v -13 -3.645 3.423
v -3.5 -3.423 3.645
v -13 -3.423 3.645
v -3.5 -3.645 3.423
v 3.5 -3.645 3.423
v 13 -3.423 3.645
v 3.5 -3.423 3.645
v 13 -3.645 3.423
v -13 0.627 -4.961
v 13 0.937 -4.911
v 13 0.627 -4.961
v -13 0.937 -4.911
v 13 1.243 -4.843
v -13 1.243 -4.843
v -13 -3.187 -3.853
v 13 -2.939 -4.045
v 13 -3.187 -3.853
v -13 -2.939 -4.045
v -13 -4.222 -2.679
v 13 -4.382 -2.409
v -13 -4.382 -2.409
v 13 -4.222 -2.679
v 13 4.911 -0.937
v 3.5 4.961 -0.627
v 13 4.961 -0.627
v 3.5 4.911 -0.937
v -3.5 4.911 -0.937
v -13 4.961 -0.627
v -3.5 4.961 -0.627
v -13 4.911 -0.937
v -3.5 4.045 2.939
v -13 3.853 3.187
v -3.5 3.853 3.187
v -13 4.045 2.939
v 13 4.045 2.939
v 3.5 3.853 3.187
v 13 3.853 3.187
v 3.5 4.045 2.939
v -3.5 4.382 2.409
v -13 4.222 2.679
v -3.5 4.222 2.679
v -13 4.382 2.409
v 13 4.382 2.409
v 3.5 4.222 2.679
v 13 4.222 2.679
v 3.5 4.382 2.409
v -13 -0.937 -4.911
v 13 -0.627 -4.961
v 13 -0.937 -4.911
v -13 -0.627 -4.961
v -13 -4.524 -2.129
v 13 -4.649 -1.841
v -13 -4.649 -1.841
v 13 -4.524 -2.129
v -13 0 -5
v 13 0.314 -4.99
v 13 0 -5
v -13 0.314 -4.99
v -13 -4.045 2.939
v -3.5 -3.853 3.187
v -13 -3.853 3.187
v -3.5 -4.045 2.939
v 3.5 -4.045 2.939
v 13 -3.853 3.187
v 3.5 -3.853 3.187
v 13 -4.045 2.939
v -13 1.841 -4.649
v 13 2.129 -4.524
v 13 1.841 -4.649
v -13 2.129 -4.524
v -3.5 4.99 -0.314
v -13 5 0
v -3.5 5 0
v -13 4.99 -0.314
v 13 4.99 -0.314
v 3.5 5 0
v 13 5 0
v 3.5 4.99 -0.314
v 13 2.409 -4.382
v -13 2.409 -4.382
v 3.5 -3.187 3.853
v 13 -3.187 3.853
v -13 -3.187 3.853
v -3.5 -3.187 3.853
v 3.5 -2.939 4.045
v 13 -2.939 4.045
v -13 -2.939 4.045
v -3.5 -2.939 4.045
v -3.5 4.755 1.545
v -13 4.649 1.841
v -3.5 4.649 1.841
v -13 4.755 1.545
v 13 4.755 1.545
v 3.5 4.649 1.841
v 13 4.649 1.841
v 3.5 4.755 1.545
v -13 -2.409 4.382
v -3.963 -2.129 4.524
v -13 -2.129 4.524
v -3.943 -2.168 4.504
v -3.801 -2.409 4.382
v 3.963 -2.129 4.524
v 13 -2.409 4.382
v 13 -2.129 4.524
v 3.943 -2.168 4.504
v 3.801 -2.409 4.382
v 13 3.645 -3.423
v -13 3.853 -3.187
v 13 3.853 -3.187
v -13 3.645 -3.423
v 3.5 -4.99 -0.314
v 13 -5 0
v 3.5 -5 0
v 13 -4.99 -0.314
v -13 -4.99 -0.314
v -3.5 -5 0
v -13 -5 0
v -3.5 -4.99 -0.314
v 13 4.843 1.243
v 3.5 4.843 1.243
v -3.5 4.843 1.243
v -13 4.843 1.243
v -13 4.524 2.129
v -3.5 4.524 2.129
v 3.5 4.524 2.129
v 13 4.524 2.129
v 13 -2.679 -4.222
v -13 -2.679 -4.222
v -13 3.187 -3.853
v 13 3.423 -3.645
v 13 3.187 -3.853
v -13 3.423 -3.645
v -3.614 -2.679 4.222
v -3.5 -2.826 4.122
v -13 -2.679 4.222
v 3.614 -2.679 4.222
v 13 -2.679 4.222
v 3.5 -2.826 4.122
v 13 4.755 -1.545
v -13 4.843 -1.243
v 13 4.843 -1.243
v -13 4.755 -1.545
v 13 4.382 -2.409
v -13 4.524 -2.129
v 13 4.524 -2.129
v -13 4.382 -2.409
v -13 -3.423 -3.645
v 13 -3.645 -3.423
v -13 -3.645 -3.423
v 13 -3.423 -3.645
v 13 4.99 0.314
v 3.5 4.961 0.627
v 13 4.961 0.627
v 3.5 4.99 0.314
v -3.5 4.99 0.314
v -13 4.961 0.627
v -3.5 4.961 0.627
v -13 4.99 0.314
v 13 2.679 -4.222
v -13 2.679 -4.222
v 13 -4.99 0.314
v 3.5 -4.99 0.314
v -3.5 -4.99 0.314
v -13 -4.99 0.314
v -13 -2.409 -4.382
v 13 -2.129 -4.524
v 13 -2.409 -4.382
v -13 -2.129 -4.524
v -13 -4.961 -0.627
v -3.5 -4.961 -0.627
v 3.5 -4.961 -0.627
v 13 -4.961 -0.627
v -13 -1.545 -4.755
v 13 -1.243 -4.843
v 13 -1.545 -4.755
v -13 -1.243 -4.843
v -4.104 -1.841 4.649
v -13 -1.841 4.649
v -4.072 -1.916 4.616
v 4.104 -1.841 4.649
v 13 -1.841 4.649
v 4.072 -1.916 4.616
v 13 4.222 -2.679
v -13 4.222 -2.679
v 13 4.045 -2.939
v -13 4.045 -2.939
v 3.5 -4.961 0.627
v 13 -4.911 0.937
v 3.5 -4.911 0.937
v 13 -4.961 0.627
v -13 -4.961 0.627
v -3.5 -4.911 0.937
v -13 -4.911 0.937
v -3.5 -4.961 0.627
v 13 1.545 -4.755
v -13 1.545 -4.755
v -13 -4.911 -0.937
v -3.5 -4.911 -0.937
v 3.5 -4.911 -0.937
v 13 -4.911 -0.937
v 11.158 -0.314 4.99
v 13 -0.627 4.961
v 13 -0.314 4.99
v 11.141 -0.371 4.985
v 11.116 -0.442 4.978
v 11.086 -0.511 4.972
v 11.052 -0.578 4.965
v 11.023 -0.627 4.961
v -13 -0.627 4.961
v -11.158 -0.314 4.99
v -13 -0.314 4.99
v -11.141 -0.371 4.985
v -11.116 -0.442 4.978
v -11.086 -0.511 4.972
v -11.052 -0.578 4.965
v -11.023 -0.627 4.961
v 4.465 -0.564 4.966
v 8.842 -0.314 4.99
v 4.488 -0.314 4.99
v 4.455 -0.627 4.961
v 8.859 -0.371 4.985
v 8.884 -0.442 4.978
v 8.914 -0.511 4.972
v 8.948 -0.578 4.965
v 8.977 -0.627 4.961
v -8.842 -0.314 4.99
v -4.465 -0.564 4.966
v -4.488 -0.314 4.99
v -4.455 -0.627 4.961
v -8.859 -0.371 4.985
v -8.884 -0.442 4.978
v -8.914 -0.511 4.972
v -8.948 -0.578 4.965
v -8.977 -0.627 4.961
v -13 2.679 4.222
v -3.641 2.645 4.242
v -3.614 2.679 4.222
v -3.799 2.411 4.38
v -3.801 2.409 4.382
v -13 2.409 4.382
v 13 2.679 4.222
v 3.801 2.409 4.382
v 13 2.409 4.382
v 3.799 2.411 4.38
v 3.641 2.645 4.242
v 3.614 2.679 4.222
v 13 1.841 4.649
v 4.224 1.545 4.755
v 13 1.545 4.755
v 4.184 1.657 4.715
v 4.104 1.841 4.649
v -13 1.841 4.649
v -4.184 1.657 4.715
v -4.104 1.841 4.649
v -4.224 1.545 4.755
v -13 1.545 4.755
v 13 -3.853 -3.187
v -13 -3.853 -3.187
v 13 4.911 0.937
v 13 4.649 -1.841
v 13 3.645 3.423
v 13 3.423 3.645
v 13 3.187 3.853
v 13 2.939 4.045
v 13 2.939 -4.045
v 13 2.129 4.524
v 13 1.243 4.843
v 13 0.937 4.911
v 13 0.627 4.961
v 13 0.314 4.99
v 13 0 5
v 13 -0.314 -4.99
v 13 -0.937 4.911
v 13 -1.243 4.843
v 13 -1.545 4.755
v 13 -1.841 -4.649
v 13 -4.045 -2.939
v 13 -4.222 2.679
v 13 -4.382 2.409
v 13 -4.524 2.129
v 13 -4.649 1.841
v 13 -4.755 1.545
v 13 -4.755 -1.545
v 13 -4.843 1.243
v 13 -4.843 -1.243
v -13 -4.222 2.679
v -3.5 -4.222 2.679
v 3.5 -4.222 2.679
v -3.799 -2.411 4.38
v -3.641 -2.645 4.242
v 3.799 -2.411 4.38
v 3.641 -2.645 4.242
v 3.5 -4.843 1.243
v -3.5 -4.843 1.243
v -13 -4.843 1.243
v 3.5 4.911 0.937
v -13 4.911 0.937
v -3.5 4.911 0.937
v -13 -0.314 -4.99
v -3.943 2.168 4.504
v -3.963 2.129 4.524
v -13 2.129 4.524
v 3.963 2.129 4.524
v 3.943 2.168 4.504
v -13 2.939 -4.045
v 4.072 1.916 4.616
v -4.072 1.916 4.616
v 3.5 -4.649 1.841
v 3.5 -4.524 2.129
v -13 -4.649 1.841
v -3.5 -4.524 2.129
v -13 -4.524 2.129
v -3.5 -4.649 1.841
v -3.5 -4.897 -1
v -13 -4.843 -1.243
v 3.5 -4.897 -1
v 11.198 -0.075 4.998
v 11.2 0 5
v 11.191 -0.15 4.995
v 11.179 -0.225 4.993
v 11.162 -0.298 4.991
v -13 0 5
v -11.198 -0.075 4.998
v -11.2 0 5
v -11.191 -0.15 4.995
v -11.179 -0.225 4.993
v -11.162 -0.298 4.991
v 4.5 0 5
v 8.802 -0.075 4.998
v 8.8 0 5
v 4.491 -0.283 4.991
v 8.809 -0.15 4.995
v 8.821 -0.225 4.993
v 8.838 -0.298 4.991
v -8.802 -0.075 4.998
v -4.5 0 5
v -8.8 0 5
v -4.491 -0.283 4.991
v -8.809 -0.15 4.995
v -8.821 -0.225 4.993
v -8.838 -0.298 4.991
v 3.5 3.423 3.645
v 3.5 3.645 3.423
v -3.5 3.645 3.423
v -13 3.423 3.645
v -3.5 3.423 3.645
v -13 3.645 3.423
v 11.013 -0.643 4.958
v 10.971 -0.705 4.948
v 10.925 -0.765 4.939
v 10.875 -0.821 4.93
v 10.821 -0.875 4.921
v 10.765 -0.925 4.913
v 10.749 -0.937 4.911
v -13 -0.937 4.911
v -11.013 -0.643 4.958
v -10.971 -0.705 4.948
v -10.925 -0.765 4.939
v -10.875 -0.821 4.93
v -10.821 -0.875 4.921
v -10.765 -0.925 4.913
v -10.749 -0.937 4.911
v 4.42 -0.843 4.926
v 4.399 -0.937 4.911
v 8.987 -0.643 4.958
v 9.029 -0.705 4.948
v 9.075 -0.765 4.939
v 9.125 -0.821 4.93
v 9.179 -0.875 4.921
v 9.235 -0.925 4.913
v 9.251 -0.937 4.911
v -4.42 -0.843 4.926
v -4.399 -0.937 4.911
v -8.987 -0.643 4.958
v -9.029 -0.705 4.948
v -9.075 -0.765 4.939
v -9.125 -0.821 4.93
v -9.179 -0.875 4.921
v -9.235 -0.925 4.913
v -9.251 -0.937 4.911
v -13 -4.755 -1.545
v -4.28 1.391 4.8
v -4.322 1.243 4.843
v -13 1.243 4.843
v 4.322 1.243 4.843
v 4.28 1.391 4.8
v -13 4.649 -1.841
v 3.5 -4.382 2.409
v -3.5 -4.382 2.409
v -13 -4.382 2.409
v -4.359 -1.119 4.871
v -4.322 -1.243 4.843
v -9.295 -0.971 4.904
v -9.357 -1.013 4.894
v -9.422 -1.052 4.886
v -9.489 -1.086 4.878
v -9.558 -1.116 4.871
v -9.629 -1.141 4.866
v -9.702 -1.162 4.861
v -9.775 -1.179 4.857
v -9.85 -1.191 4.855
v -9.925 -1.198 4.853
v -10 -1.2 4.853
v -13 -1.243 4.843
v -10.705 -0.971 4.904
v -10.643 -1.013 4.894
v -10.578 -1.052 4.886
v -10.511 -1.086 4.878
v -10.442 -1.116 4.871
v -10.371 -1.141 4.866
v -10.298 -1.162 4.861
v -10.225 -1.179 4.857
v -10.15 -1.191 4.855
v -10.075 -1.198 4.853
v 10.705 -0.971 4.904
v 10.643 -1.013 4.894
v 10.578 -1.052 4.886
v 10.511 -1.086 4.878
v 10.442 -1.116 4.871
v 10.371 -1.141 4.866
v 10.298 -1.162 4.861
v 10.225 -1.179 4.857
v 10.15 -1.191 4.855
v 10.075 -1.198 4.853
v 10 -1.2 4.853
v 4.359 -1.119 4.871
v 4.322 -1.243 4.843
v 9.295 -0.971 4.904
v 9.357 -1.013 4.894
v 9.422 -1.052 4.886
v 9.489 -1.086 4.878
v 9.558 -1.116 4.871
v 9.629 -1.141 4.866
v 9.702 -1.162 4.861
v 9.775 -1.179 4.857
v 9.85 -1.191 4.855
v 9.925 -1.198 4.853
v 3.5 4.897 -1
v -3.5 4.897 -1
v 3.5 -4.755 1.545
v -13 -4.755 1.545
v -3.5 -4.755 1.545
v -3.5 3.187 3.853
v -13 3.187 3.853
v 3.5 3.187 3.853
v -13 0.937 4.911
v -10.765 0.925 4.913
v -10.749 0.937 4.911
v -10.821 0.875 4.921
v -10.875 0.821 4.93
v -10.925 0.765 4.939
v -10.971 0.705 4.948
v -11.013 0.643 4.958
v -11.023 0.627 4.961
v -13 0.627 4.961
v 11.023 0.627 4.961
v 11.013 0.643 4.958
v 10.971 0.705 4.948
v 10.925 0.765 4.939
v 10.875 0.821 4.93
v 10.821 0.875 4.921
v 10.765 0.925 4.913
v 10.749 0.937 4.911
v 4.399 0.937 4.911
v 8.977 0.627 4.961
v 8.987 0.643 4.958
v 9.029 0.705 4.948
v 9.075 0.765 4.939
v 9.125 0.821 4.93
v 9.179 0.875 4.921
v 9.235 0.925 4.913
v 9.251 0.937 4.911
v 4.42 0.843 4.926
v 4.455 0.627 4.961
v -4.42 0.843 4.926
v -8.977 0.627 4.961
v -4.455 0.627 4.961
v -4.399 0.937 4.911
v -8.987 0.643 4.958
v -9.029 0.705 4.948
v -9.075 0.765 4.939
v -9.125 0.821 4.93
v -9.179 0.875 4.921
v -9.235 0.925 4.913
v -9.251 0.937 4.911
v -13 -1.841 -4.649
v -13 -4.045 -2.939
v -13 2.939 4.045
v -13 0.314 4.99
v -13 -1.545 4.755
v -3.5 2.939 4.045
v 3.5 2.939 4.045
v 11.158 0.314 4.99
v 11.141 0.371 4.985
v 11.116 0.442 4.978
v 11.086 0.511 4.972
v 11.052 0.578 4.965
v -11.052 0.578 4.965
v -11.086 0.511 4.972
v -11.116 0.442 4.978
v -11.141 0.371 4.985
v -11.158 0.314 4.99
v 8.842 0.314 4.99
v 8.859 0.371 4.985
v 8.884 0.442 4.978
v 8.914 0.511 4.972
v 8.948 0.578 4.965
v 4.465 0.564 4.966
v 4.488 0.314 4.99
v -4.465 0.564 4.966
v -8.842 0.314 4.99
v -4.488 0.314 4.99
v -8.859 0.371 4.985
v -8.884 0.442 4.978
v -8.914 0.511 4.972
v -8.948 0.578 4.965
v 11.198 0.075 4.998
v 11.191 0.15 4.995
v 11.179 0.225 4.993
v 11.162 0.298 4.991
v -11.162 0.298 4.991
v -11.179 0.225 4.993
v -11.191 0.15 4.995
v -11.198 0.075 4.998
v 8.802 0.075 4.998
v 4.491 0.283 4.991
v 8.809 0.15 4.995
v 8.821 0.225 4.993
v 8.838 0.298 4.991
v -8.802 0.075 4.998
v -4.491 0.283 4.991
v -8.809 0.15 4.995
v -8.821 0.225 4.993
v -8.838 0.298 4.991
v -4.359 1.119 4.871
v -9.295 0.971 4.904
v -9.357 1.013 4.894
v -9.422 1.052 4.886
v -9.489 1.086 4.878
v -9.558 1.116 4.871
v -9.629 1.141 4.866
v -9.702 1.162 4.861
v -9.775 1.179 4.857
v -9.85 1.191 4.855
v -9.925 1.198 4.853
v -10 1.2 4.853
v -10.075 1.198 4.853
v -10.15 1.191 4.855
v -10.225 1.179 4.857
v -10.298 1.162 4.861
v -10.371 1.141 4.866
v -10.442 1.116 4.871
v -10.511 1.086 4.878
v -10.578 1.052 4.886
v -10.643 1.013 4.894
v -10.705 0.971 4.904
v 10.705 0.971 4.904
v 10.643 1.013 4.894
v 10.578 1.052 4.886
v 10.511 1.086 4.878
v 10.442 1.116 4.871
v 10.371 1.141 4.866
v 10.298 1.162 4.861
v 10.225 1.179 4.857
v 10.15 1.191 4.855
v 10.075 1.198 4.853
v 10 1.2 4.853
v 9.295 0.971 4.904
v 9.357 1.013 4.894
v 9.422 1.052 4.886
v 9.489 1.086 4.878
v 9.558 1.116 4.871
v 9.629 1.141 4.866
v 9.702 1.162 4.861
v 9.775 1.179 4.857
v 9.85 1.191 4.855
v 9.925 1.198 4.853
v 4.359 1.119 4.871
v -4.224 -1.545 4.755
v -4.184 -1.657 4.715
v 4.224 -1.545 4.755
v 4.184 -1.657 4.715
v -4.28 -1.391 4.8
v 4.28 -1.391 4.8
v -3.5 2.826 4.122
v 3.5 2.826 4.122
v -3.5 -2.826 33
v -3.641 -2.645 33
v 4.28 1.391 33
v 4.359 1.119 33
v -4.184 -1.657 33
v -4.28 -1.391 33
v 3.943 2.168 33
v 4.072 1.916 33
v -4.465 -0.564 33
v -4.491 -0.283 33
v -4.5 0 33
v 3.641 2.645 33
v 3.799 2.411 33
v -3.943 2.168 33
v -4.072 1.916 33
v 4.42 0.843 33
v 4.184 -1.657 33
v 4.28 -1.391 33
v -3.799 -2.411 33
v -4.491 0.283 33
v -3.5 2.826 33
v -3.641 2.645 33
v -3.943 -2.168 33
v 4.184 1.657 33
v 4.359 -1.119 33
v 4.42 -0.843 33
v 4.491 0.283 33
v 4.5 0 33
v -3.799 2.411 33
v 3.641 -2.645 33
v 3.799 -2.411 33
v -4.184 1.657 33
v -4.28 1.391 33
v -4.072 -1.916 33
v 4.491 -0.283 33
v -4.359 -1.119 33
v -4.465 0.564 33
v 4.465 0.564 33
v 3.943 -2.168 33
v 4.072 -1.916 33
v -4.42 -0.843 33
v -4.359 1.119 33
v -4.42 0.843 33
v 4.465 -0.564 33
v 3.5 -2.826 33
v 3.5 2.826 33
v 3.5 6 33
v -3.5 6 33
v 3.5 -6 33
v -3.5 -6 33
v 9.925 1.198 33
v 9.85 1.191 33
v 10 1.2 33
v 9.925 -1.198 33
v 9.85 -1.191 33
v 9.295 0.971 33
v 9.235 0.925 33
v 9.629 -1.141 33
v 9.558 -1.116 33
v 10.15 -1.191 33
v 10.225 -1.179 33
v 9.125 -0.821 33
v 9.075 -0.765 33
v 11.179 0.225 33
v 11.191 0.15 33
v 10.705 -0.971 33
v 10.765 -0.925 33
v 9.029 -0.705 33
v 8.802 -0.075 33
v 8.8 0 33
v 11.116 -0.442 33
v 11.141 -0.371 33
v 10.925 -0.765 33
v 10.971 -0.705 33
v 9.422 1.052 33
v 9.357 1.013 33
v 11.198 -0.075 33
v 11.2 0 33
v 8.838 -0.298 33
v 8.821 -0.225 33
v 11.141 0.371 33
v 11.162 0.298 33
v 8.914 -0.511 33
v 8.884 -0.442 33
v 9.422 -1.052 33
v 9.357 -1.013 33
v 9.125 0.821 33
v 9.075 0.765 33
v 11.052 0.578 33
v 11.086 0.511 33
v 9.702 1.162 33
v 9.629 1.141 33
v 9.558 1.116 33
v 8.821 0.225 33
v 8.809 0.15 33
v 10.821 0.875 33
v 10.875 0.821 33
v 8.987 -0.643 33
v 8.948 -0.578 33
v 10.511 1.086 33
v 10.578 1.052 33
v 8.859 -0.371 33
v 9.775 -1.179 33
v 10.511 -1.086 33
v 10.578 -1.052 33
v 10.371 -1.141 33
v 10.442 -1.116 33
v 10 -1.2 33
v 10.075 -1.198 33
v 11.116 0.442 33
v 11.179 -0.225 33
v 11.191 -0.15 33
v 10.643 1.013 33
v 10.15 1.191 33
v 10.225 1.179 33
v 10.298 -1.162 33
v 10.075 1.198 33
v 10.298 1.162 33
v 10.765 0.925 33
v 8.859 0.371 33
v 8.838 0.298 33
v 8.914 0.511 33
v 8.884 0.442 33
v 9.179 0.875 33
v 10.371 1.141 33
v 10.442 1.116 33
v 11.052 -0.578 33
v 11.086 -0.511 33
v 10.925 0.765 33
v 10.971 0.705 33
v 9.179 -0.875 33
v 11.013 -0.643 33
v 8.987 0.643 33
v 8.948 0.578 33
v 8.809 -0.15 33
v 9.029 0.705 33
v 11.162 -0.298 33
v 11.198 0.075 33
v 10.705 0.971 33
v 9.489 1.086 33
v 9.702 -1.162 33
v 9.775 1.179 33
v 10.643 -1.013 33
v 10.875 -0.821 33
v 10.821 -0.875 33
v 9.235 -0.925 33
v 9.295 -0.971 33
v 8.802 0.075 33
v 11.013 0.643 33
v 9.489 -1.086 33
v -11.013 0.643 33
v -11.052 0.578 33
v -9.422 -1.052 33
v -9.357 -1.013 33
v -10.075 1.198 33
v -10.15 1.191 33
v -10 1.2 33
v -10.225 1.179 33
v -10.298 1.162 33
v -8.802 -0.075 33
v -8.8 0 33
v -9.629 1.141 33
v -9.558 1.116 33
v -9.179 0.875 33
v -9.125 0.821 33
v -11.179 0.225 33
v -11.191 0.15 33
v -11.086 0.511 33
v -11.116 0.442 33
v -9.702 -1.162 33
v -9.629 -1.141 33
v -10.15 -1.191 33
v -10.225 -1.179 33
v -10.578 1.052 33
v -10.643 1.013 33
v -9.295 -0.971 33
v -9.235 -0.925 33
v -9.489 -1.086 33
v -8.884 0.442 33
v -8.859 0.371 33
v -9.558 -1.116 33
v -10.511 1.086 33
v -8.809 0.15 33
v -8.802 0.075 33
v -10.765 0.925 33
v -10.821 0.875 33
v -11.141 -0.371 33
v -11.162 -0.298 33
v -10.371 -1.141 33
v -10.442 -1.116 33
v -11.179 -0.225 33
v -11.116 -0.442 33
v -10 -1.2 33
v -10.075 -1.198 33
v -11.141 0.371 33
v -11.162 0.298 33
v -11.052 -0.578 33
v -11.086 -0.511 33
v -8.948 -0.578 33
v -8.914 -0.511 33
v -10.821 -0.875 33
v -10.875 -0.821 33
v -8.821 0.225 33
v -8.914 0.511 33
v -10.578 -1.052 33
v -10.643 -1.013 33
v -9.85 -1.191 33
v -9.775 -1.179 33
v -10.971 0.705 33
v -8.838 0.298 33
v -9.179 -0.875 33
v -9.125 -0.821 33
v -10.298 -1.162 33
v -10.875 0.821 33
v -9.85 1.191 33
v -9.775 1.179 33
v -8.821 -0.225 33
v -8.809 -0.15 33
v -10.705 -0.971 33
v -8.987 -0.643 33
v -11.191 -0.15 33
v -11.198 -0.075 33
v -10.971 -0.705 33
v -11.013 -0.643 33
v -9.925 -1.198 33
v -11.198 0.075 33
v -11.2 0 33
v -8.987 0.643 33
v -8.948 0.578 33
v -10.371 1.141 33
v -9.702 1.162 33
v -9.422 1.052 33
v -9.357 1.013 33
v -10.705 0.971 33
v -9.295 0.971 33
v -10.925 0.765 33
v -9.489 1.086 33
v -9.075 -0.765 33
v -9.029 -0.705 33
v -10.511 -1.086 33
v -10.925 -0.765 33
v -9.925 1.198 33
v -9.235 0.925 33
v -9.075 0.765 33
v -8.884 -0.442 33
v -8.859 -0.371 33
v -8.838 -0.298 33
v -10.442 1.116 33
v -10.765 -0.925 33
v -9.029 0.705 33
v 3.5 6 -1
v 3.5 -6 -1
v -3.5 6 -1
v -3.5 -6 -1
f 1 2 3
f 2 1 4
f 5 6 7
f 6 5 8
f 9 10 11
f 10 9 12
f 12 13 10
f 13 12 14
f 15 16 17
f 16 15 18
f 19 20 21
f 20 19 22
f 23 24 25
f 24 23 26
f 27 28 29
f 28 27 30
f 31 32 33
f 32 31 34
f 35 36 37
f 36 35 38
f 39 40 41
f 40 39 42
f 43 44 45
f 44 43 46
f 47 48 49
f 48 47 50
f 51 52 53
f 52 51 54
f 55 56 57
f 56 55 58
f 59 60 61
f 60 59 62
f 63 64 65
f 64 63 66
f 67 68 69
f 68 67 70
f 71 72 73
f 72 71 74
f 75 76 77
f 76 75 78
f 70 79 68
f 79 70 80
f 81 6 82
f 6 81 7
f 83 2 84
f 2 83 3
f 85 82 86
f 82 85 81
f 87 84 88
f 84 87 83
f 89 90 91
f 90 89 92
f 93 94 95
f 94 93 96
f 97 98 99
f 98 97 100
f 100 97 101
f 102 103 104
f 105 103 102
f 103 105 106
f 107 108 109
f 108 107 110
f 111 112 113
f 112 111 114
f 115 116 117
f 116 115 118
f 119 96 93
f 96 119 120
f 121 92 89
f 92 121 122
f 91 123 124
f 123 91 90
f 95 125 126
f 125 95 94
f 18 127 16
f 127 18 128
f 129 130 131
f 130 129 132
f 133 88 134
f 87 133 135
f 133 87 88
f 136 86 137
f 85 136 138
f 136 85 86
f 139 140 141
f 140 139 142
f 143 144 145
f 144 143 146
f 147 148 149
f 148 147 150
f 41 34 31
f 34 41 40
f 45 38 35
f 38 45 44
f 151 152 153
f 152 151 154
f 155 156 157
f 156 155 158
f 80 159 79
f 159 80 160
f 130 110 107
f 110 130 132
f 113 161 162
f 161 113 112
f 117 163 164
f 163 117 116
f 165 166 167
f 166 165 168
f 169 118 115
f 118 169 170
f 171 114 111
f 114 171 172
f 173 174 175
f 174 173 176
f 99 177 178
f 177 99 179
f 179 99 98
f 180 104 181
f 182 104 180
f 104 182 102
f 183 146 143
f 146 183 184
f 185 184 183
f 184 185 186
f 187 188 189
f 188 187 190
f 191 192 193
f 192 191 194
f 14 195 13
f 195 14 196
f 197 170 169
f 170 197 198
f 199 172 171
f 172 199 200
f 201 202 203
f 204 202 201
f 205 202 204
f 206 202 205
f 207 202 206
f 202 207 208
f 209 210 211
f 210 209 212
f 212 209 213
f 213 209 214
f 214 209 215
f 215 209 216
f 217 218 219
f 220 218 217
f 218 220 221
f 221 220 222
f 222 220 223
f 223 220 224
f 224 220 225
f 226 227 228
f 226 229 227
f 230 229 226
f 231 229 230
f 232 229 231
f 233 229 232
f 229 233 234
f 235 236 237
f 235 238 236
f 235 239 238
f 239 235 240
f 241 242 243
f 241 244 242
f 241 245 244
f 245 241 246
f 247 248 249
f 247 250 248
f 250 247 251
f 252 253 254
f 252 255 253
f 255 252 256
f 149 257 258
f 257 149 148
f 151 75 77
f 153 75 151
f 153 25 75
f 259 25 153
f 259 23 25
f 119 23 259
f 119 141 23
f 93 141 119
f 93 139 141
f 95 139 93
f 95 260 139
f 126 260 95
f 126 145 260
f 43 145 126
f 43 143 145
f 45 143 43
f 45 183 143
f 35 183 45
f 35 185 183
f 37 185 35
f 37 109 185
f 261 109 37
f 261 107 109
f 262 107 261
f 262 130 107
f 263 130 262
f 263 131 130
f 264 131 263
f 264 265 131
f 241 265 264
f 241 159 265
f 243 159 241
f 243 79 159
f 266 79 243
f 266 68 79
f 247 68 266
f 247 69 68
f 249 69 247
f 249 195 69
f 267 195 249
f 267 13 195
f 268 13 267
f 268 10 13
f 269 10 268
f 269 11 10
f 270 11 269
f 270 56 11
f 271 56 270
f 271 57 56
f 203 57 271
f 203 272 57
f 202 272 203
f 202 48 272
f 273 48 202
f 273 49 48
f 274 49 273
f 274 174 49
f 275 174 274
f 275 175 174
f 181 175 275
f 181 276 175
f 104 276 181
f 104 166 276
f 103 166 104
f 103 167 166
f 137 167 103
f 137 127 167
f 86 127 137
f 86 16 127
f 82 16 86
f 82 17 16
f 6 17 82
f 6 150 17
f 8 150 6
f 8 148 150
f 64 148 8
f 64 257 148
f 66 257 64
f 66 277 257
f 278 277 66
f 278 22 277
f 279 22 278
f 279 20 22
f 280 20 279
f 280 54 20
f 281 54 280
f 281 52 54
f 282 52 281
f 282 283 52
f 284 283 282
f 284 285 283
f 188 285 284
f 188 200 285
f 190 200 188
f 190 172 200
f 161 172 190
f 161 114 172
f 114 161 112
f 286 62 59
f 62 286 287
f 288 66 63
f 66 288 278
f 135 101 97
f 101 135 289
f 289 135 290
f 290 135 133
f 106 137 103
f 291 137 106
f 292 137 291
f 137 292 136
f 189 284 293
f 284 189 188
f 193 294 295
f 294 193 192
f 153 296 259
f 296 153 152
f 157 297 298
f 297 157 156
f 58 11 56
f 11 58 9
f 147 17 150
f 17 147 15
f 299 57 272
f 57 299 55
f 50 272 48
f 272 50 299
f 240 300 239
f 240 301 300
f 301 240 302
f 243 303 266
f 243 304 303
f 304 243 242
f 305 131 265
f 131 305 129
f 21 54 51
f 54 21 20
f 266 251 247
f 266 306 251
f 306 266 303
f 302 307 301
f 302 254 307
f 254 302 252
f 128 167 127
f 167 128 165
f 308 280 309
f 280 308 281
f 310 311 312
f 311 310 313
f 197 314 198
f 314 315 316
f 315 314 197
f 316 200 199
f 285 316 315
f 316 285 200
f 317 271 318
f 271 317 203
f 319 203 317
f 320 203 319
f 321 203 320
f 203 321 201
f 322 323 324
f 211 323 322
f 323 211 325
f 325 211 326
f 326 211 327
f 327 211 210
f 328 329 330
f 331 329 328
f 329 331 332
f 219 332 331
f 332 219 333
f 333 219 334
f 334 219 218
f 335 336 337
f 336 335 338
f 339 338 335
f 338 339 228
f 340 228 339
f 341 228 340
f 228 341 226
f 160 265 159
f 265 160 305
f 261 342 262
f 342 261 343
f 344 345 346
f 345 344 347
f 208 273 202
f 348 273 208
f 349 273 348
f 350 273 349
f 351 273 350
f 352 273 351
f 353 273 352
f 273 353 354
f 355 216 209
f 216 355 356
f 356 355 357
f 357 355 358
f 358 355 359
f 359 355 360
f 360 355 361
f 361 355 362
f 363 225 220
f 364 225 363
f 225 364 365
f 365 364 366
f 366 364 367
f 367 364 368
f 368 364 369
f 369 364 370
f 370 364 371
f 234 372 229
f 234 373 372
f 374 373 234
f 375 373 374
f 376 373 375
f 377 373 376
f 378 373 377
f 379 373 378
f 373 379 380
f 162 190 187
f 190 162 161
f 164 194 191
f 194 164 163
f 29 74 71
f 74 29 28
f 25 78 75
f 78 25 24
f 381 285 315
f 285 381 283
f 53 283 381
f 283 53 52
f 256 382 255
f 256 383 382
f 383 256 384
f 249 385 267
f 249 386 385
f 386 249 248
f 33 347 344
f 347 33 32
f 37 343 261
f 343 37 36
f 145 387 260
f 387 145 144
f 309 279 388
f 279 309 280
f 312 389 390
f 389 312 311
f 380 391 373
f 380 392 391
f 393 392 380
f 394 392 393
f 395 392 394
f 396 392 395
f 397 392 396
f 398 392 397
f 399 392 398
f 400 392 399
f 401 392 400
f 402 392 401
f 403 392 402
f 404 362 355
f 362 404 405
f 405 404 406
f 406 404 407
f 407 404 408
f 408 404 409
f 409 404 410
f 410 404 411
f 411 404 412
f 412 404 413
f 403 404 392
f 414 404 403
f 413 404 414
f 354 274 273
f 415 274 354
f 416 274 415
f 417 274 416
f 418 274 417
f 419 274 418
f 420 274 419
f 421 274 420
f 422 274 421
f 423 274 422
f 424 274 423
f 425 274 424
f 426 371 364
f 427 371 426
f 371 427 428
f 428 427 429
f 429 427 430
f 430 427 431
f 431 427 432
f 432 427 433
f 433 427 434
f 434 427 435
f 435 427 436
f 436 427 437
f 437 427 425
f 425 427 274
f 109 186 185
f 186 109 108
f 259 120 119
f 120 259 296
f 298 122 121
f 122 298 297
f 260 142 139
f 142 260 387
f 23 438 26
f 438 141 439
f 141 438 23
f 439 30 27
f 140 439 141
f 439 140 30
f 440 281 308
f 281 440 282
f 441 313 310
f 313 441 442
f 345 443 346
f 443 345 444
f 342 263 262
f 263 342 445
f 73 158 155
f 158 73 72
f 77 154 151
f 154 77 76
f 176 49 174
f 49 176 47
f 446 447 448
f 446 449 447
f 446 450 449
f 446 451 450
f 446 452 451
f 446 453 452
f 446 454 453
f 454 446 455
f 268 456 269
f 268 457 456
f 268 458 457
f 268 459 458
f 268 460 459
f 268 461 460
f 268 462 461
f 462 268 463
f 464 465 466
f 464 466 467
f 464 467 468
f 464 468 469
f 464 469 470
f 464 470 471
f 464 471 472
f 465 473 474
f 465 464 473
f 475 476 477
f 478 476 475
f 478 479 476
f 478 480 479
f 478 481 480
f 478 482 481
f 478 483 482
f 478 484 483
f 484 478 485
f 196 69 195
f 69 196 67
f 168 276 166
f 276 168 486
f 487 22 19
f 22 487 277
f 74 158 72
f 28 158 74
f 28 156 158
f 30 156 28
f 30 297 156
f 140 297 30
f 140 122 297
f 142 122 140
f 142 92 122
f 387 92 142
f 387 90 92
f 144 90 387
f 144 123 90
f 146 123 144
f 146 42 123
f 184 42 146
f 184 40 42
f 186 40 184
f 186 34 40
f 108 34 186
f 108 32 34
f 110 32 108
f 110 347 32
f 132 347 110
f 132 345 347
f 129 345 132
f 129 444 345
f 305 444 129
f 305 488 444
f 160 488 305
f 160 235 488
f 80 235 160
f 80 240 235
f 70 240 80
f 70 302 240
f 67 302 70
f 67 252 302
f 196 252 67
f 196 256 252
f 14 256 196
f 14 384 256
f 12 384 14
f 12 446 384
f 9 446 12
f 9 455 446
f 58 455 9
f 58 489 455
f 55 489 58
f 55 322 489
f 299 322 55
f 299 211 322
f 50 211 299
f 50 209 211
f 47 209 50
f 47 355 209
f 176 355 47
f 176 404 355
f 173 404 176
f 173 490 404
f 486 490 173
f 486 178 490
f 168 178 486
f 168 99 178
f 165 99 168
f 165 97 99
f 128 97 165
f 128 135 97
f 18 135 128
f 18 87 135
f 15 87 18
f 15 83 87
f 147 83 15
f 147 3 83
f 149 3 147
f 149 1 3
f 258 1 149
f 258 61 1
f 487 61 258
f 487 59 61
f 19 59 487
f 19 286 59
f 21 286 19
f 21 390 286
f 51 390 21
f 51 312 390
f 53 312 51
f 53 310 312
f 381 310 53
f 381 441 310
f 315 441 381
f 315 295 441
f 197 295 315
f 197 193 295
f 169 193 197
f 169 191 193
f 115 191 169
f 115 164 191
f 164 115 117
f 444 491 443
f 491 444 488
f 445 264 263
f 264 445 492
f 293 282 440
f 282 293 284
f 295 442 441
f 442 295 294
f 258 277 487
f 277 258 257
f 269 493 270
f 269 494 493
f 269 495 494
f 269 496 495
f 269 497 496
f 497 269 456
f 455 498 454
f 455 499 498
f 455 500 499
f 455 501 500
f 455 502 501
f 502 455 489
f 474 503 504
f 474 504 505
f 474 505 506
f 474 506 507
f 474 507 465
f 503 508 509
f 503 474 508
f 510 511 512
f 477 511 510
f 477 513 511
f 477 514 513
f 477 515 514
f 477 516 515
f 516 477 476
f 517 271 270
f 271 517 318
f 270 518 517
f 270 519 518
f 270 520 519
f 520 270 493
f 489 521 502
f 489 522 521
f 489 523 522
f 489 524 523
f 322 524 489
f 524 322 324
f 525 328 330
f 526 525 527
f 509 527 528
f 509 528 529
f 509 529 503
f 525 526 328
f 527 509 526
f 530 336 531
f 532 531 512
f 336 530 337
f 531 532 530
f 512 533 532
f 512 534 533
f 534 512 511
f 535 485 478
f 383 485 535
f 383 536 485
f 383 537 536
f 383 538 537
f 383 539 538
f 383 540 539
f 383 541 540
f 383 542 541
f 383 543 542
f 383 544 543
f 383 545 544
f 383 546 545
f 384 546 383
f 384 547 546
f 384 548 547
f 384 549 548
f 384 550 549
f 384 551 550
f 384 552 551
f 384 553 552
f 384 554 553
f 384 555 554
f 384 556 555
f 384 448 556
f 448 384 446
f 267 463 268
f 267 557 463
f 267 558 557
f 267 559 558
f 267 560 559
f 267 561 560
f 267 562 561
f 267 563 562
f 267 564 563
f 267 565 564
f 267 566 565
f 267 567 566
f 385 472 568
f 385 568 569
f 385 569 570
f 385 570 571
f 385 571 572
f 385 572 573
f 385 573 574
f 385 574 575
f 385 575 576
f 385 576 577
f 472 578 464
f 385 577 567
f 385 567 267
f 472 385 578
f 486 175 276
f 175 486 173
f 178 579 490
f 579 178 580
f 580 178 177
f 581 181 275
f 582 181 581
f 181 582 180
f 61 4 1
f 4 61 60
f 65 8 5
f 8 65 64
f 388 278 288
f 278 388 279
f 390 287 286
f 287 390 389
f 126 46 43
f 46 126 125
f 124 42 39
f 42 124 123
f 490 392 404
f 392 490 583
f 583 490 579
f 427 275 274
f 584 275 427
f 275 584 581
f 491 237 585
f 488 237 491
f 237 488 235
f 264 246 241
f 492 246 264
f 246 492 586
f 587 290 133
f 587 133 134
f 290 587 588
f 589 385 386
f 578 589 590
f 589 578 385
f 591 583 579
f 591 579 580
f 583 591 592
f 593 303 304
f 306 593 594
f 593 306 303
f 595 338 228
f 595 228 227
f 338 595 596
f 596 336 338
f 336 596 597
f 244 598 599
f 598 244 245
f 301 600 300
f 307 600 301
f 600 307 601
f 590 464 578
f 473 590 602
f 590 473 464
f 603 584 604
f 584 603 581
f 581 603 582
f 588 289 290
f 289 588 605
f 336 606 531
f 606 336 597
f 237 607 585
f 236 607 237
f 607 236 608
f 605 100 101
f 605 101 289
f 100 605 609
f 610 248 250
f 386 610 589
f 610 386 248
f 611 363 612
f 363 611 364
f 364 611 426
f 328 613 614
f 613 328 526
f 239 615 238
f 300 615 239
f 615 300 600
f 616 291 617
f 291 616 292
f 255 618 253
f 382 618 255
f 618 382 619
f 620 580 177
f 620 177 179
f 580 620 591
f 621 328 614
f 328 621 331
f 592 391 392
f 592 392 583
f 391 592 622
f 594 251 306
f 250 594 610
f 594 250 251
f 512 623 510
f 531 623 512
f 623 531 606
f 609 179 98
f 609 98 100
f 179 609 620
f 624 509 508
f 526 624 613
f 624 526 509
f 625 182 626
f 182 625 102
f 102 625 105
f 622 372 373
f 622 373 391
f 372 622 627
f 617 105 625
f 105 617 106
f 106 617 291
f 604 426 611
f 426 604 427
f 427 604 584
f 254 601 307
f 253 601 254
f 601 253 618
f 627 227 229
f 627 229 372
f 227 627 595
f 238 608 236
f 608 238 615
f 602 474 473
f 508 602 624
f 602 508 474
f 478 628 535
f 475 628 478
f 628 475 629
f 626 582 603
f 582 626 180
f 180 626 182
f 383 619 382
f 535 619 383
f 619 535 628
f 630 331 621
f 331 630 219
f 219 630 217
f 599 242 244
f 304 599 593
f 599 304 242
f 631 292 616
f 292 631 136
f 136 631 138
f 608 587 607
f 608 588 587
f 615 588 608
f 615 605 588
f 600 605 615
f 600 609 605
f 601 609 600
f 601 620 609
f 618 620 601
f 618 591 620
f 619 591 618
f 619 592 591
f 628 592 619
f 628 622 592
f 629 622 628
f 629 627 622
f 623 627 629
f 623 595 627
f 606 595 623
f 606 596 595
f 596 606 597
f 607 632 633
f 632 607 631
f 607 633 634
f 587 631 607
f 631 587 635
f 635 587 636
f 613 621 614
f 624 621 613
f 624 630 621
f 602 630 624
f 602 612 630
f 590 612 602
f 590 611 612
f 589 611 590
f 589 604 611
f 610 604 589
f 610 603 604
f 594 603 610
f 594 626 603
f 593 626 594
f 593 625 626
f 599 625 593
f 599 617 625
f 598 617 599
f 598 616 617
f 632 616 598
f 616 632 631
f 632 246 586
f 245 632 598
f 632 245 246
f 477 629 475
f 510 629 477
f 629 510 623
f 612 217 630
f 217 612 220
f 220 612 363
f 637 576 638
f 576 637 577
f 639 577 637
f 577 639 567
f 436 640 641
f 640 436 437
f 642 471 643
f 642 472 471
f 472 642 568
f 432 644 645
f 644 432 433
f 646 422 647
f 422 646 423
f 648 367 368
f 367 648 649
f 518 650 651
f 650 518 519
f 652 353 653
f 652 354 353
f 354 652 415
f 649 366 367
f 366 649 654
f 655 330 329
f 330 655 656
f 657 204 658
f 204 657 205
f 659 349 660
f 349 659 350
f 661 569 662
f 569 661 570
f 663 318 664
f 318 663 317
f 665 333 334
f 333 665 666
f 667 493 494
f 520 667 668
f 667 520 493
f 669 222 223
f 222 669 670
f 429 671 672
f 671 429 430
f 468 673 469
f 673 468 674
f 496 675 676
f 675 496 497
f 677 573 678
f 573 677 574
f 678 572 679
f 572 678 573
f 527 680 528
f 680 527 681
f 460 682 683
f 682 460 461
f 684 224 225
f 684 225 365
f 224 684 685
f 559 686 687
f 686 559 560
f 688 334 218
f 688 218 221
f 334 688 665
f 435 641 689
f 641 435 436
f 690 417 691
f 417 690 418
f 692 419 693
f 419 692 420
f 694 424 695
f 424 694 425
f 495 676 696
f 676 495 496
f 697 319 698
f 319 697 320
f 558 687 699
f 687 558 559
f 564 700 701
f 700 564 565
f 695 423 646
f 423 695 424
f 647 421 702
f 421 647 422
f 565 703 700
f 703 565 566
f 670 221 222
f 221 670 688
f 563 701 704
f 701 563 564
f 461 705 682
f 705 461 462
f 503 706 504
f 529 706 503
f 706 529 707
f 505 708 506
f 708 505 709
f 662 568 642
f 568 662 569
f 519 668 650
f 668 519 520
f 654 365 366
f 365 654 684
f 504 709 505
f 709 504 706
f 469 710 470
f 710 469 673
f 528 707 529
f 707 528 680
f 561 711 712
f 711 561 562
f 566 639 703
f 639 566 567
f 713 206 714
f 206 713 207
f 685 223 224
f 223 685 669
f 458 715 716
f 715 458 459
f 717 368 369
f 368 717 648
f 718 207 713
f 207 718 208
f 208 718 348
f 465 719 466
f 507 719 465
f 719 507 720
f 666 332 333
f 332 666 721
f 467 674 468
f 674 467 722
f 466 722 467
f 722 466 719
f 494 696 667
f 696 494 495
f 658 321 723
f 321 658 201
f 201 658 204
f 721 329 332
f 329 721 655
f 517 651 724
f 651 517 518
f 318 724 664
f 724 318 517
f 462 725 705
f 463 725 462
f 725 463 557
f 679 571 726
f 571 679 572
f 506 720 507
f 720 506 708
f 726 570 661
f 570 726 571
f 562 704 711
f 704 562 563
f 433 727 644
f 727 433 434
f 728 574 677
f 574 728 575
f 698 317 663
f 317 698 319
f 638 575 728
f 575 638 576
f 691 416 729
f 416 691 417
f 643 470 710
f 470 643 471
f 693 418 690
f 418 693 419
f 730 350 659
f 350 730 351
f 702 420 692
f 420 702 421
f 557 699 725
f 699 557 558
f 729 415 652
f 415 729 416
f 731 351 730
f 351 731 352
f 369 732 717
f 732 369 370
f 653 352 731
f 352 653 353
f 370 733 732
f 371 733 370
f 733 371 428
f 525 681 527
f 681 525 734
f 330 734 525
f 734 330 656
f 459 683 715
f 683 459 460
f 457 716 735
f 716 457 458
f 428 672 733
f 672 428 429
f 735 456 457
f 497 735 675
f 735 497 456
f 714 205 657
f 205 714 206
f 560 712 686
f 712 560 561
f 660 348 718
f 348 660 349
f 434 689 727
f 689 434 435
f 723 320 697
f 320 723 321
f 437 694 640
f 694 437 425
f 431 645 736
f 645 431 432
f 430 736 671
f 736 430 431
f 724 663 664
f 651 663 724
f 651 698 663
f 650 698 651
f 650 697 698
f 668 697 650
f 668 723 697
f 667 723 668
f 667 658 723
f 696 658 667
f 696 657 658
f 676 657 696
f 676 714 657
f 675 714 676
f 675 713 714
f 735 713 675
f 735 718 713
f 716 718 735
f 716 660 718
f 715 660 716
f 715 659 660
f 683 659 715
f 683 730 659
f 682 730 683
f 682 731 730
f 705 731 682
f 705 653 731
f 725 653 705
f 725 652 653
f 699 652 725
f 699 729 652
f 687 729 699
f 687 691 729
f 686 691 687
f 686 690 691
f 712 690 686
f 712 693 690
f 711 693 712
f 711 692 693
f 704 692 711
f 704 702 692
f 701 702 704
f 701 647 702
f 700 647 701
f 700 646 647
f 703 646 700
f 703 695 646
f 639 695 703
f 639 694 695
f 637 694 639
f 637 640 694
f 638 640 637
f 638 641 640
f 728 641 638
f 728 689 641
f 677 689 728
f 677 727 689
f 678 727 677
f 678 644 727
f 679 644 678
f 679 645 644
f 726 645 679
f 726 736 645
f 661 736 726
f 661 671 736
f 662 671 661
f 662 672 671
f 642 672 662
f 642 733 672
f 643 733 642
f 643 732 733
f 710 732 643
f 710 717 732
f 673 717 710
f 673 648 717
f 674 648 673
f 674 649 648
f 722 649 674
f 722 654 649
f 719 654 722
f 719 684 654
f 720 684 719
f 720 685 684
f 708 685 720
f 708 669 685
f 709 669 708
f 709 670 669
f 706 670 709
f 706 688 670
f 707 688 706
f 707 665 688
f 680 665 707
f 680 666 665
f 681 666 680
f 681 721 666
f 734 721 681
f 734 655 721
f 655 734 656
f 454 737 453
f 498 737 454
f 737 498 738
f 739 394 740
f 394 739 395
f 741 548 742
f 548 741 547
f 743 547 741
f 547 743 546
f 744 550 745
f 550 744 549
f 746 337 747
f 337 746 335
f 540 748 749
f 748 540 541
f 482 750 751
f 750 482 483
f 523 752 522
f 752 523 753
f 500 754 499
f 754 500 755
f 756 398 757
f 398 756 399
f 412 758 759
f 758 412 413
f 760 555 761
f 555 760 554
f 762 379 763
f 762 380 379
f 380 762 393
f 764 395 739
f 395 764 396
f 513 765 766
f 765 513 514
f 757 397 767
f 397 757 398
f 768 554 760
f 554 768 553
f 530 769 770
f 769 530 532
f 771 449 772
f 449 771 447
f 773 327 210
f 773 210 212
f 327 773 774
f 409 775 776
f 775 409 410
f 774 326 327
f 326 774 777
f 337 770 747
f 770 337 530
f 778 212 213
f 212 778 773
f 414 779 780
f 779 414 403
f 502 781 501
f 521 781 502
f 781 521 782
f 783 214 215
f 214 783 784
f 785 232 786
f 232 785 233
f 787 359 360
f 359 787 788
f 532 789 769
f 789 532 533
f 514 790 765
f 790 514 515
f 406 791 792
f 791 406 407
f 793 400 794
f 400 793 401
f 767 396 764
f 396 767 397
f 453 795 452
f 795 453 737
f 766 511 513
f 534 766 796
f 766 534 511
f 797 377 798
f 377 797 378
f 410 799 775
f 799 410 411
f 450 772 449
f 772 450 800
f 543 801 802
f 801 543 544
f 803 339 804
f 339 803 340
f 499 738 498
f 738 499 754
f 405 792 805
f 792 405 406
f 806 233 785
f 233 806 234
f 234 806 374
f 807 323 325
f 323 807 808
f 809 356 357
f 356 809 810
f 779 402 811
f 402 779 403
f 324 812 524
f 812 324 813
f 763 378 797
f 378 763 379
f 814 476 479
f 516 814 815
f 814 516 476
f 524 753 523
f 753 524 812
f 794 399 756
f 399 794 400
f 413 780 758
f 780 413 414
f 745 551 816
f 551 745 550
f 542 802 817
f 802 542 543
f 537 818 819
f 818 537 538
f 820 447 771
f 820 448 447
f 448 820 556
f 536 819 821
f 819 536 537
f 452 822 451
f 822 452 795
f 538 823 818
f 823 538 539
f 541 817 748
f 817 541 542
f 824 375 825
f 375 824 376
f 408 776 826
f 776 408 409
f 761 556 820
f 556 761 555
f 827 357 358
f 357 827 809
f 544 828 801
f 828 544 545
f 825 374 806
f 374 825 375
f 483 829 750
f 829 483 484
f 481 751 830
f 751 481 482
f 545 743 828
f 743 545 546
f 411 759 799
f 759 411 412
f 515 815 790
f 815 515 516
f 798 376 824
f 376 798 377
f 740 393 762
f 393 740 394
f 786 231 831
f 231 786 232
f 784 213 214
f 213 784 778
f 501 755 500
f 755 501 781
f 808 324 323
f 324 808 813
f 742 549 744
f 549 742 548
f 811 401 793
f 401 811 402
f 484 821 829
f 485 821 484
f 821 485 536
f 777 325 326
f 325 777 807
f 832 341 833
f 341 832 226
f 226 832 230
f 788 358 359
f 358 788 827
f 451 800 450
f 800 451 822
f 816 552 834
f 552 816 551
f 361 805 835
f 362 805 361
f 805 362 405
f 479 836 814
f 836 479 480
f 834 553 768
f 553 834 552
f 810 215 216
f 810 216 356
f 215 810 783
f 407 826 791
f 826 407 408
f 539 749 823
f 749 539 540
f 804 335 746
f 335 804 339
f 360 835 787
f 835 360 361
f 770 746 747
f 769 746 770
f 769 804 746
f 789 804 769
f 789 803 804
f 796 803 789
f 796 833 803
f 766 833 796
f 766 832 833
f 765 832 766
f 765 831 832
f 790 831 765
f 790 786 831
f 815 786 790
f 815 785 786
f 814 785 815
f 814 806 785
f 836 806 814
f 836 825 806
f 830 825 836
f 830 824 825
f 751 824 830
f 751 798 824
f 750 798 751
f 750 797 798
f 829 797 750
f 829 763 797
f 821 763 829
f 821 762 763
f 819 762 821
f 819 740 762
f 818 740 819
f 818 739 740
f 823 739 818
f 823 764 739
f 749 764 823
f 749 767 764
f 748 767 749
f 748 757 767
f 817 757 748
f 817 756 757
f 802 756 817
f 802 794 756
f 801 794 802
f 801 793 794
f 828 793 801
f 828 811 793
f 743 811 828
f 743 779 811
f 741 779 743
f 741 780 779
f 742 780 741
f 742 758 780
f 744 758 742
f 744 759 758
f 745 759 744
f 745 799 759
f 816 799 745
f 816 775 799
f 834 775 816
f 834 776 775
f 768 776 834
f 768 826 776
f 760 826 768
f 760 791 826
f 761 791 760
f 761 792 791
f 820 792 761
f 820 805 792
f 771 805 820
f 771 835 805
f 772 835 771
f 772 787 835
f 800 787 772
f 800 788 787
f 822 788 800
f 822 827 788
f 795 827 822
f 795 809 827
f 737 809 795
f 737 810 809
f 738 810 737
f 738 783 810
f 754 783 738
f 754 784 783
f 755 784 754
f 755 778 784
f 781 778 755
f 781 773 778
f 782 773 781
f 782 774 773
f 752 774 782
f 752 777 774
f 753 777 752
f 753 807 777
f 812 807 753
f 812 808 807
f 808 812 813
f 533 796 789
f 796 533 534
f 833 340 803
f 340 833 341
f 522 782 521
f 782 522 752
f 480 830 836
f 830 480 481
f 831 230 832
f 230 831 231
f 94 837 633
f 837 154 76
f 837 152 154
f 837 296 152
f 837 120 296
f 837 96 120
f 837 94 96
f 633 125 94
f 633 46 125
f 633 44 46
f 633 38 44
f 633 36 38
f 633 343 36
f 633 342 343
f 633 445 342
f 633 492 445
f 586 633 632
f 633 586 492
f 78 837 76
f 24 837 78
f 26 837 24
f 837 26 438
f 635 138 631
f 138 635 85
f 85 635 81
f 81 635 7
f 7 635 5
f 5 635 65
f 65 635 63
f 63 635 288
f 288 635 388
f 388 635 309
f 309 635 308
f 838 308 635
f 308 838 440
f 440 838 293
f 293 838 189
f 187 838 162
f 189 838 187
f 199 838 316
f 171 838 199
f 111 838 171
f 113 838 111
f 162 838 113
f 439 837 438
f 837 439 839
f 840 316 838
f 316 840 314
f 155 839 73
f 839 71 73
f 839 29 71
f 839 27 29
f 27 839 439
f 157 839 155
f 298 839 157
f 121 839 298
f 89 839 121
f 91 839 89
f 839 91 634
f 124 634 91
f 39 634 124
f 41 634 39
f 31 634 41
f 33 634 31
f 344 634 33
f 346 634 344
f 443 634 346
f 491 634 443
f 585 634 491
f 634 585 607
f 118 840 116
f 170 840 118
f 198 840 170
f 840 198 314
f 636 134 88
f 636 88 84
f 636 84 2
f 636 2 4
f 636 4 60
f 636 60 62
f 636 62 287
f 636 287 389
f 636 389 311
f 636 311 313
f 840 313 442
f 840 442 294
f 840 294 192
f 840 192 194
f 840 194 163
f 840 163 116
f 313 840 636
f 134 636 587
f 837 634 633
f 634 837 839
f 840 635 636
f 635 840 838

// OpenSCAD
translate([0,-7,-7]){


        difference(){
            union(){

                translate([-13,7,7]){
                    rotate([0,90,0]){
                        cylinder(h=26, r=5, $fn=100, center=false);
                    }
                }  


                translate([0,7,7]){
                    rotate([0,0,90]){
                        cylinder(h=40-7, r=4.5, $fn=100, center=false);
                    }
                }  

                translate([10,7,7]){
                    rotate([0,0,90]){
                        cylinder(h=40-7, r=1.2, $fn=100, center=false);
                    }
                }  
                translate([-10,7,7]){
                    rotate([0,0,90]){
                        cylinder(h=40-7, r=1.2, $fn=100, center=false);
                    }
                }  


                translate([-3.5,1,6]){
                    cube([7,12,34], center=false);
                }

            }
            union() {



            }
        }
}
